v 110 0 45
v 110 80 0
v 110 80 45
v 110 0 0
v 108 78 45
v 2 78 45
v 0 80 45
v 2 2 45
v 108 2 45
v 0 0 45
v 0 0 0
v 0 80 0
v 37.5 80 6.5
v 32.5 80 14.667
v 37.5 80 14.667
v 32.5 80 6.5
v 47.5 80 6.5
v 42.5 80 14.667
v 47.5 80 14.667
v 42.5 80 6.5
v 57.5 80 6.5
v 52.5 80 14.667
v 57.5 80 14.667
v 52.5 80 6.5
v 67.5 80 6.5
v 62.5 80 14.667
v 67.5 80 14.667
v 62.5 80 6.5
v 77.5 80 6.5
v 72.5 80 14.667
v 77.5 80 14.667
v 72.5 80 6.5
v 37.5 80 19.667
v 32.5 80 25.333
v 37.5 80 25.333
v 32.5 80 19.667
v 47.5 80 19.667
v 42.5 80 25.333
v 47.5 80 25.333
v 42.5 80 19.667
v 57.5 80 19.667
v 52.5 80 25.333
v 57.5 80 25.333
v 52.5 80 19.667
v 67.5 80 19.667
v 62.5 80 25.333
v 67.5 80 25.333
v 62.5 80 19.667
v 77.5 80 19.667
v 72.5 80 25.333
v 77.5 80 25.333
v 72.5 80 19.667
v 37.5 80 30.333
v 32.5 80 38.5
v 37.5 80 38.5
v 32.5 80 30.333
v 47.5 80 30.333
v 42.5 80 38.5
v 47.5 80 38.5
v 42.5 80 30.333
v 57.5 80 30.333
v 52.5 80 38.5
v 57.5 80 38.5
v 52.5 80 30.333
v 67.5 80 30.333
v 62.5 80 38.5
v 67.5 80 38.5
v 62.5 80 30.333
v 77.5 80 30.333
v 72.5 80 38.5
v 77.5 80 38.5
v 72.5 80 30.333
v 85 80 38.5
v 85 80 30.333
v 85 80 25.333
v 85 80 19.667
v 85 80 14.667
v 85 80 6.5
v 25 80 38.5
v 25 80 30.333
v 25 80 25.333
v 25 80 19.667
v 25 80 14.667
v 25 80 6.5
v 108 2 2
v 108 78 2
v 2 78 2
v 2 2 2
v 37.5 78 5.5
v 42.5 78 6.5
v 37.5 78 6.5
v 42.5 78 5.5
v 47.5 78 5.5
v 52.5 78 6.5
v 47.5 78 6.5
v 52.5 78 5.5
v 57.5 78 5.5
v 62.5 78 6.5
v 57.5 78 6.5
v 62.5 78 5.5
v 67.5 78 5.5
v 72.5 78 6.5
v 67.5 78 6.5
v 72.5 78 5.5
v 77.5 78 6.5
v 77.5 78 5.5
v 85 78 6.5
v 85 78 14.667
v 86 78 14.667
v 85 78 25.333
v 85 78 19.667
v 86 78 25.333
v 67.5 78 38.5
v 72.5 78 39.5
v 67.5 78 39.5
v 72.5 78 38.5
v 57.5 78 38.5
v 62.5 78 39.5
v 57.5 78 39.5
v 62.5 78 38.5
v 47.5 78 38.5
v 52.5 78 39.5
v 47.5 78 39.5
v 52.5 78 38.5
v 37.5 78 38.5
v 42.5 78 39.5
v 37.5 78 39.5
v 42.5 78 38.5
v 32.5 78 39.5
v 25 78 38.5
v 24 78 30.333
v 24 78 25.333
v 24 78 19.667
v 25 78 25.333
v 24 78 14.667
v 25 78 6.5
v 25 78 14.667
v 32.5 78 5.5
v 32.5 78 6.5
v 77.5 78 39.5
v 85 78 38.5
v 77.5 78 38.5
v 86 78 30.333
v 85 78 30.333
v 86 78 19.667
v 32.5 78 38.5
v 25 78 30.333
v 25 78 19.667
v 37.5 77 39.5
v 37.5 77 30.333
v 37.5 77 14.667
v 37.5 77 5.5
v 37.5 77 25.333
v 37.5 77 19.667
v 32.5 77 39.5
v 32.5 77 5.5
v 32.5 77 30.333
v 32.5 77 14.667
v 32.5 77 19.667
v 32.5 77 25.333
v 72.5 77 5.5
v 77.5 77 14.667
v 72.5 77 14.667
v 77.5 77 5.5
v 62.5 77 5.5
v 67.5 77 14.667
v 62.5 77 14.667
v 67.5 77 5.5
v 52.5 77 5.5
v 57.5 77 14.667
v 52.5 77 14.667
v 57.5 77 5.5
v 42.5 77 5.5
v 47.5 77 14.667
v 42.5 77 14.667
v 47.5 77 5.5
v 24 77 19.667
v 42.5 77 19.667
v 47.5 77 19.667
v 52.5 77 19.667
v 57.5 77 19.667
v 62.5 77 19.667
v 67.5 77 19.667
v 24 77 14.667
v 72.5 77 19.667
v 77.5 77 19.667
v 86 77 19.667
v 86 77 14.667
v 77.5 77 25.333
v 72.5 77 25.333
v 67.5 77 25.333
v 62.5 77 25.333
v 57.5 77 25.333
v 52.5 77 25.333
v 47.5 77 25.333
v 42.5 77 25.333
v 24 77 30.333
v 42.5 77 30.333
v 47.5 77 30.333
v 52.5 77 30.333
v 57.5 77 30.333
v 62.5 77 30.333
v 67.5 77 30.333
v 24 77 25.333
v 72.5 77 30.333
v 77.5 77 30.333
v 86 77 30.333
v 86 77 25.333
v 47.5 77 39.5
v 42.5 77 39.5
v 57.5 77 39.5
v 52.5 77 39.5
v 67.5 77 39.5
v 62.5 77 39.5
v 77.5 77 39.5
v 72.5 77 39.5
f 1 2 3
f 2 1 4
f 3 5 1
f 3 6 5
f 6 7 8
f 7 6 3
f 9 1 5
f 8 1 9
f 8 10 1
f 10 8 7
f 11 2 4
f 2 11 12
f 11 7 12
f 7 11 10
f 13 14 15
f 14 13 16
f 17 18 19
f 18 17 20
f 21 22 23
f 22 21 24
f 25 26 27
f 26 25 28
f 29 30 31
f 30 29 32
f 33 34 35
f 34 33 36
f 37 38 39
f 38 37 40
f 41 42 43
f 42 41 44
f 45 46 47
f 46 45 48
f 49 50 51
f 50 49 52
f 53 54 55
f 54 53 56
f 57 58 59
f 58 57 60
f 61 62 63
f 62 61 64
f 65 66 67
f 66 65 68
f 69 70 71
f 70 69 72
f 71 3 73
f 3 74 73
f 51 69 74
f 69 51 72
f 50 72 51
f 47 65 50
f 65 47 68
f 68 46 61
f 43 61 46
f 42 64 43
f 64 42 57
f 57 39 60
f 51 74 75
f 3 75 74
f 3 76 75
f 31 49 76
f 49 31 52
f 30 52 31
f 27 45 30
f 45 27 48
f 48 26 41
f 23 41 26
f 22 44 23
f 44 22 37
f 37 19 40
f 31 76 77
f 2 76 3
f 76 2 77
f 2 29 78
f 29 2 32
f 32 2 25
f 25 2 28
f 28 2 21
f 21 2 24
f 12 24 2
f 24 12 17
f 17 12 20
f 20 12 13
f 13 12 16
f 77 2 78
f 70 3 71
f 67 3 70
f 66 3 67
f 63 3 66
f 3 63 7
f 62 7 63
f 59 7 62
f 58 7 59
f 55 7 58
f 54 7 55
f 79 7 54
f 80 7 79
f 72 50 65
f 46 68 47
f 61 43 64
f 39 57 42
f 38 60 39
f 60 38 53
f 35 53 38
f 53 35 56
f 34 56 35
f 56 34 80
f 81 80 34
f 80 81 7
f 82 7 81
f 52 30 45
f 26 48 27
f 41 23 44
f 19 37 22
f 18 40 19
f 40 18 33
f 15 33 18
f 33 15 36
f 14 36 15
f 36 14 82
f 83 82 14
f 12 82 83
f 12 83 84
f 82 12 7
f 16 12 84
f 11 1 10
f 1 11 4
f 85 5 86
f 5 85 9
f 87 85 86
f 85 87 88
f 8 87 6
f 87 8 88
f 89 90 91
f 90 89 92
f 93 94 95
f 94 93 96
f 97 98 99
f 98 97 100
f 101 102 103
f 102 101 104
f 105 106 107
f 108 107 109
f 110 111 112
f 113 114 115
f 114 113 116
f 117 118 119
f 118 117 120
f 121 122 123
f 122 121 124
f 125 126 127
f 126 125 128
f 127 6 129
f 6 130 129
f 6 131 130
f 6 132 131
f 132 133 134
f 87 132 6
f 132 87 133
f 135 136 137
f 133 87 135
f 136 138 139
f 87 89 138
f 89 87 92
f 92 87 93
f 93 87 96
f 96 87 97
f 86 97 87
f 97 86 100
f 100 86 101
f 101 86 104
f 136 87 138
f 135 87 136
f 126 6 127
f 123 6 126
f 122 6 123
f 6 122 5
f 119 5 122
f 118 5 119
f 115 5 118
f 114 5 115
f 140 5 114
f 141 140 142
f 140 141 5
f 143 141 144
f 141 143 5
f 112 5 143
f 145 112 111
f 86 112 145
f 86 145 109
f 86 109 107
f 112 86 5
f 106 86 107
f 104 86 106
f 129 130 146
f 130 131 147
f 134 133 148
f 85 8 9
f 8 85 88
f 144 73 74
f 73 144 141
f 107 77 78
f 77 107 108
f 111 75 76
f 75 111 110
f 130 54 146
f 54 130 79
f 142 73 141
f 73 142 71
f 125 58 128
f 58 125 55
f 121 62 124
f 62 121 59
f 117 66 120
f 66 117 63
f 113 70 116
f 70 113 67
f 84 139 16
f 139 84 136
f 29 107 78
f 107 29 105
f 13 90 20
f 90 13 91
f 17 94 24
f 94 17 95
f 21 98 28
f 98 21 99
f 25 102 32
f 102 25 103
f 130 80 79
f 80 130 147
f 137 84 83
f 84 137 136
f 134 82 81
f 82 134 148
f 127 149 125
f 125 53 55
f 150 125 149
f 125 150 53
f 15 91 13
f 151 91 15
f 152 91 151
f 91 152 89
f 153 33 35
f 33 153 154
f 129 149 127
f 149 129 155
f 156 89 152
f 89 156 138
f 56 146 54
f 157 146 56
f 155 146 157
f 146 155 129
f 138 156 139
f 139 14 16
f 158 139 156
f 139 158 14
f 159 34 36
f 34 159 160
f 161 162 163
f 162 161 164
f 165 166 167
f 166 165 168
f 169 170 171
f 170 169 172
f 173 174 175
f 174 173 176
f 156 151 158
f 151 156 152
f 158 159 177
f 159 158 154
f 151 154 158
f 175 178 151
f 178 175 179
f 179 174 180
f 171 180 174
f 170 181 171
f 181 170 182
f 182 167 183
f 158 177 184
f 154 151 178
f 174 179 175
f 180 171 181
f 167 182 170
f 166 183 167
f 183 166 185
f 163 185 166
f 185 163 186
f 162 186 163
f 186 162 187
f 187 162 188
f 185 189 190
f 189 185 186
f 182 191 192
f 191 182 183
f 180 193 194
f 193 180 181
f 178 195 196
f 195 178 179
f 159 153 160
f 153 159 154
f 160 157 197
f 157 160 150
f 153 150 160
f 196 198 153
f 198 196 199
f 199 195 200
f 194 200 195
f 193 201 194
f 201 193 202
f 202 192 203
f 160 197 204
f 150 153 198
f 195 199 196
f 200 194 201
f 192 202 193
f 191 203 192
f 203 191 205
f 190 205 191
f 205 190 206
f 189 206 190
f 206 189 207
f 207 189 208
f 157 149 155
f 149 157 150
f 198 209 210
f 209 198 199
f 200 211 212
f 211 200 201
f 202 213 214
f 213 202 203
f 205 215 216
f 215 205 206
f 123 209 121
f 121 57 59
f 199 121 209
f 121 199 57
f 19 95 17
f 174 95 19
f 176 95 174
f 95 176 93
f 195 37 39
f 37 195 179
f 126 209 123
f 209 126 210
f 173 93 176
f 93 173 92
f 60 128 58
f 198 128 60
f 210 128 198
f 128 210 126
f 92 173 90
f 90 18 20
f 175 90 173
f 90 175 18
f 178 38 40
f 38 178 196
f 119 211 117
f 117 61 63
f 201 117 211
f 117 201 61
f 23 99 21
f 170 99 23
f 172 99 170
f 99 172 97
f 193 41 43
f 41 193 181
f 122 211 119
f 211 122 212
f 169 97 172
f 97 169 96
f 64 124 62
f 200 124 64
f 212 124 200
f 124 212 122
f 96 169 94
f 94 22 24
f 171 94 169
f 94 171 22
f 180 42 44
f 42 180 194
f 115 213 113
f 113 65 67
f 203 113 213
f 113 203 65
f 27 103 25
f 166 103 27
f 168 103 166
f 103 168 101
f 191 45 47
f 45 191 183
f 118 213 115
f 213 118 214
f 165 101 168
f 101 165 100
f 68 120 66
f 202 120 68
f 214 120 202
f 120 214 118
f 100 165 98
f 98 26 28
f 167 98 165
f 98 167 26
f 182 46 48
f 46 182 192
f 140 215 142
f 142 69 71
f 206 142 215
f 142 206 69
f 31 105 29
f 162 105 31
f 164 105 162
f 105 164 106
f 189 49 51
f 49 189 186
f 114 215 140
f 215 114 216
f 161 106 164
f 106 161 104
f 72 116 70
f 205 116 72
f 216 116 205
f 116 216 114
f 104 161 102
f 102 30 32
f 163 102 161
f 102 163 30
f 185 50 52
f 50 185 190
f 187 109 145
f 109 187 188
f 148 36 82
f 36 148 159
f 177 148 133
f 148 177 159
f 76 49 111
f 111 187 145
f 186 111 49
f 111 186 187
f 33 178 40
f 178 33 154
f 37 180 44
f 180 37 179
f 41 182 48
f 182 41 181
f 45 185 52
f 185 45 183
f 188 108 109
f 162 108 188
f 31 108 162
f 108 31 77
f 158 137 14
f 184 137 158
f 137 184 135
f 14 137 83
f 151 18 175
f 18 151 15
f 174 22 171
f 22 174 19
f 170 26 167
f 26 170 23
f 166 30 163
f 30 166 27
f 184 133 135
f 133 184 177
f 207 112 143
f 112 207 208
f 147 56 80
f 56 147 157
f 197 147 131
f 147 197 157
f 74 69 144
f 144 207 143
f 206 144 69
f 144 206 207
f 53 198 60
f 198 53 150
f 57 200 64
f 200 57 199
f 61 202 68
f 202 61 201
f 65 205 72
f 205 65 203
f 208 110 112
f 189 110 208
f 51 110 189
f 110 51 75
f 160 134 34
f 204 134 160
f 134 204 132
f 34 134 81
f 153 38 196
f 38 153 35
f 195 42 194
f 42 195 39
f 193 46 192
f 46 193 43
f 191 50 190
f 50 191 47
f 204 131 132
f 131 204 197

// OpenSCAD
$fn = 32;

// ----------------------------------------------------------------------
// Vent box: crossgrid enclosure
// ----------------------------------------------------------------------

// --- parameters (mm) ---
box_l = 110;              // box length, X
box_w = 80;               // box width, Y
box_h = 45;               // box height, Z
wall_t = 2;               // shell wall thickness
win_l = 60;               // vent window width, X
win_h = 32;               // vent window height, Z
bar_w = 5;                // grid bar width
n_v = 5;                  // vertical bar count
n_h = 2;                  // horizontal bar count

win_z0 = (box_h - win_h) / 2;  // window lower edge Z
v_step = win_l / (n_v + 1);  // vertical bar step
h_step = win_h / (n_h + 1);  // horizontal bar step

difference() {
  union() {
    difference() {
      cube([box_l, box_w, box_h]);
  translate([wall_t, wall_t, wall_t])
    cube([box_l - 2 * wall_t, box_w - 2 * wall_t, box_h]);
  translate([(box_l - win_l) / 2, box_w - wall_t - 1, win_z0])
    cube([win_l, wall_t + 2, win_h]);
    }
    for (i = [1 : n_v])
      translate([(box_l - win_l) / 2 + i * v_step - bar_w / 2,
                 box_w - wall_t - 1, win_z0 - 1])
        cube([bar_w, wall_t + 1, win_h + 2]);
    for (i = [1 : n_h])
      translate([(box_l - win_l) / 2 - 1, box_w - wall_t - 1,
                 win_z0 + i * h_step - bar_w / 2])
        cube([win_l + 2, wall_t + 1, bar_w]);
  }
}
